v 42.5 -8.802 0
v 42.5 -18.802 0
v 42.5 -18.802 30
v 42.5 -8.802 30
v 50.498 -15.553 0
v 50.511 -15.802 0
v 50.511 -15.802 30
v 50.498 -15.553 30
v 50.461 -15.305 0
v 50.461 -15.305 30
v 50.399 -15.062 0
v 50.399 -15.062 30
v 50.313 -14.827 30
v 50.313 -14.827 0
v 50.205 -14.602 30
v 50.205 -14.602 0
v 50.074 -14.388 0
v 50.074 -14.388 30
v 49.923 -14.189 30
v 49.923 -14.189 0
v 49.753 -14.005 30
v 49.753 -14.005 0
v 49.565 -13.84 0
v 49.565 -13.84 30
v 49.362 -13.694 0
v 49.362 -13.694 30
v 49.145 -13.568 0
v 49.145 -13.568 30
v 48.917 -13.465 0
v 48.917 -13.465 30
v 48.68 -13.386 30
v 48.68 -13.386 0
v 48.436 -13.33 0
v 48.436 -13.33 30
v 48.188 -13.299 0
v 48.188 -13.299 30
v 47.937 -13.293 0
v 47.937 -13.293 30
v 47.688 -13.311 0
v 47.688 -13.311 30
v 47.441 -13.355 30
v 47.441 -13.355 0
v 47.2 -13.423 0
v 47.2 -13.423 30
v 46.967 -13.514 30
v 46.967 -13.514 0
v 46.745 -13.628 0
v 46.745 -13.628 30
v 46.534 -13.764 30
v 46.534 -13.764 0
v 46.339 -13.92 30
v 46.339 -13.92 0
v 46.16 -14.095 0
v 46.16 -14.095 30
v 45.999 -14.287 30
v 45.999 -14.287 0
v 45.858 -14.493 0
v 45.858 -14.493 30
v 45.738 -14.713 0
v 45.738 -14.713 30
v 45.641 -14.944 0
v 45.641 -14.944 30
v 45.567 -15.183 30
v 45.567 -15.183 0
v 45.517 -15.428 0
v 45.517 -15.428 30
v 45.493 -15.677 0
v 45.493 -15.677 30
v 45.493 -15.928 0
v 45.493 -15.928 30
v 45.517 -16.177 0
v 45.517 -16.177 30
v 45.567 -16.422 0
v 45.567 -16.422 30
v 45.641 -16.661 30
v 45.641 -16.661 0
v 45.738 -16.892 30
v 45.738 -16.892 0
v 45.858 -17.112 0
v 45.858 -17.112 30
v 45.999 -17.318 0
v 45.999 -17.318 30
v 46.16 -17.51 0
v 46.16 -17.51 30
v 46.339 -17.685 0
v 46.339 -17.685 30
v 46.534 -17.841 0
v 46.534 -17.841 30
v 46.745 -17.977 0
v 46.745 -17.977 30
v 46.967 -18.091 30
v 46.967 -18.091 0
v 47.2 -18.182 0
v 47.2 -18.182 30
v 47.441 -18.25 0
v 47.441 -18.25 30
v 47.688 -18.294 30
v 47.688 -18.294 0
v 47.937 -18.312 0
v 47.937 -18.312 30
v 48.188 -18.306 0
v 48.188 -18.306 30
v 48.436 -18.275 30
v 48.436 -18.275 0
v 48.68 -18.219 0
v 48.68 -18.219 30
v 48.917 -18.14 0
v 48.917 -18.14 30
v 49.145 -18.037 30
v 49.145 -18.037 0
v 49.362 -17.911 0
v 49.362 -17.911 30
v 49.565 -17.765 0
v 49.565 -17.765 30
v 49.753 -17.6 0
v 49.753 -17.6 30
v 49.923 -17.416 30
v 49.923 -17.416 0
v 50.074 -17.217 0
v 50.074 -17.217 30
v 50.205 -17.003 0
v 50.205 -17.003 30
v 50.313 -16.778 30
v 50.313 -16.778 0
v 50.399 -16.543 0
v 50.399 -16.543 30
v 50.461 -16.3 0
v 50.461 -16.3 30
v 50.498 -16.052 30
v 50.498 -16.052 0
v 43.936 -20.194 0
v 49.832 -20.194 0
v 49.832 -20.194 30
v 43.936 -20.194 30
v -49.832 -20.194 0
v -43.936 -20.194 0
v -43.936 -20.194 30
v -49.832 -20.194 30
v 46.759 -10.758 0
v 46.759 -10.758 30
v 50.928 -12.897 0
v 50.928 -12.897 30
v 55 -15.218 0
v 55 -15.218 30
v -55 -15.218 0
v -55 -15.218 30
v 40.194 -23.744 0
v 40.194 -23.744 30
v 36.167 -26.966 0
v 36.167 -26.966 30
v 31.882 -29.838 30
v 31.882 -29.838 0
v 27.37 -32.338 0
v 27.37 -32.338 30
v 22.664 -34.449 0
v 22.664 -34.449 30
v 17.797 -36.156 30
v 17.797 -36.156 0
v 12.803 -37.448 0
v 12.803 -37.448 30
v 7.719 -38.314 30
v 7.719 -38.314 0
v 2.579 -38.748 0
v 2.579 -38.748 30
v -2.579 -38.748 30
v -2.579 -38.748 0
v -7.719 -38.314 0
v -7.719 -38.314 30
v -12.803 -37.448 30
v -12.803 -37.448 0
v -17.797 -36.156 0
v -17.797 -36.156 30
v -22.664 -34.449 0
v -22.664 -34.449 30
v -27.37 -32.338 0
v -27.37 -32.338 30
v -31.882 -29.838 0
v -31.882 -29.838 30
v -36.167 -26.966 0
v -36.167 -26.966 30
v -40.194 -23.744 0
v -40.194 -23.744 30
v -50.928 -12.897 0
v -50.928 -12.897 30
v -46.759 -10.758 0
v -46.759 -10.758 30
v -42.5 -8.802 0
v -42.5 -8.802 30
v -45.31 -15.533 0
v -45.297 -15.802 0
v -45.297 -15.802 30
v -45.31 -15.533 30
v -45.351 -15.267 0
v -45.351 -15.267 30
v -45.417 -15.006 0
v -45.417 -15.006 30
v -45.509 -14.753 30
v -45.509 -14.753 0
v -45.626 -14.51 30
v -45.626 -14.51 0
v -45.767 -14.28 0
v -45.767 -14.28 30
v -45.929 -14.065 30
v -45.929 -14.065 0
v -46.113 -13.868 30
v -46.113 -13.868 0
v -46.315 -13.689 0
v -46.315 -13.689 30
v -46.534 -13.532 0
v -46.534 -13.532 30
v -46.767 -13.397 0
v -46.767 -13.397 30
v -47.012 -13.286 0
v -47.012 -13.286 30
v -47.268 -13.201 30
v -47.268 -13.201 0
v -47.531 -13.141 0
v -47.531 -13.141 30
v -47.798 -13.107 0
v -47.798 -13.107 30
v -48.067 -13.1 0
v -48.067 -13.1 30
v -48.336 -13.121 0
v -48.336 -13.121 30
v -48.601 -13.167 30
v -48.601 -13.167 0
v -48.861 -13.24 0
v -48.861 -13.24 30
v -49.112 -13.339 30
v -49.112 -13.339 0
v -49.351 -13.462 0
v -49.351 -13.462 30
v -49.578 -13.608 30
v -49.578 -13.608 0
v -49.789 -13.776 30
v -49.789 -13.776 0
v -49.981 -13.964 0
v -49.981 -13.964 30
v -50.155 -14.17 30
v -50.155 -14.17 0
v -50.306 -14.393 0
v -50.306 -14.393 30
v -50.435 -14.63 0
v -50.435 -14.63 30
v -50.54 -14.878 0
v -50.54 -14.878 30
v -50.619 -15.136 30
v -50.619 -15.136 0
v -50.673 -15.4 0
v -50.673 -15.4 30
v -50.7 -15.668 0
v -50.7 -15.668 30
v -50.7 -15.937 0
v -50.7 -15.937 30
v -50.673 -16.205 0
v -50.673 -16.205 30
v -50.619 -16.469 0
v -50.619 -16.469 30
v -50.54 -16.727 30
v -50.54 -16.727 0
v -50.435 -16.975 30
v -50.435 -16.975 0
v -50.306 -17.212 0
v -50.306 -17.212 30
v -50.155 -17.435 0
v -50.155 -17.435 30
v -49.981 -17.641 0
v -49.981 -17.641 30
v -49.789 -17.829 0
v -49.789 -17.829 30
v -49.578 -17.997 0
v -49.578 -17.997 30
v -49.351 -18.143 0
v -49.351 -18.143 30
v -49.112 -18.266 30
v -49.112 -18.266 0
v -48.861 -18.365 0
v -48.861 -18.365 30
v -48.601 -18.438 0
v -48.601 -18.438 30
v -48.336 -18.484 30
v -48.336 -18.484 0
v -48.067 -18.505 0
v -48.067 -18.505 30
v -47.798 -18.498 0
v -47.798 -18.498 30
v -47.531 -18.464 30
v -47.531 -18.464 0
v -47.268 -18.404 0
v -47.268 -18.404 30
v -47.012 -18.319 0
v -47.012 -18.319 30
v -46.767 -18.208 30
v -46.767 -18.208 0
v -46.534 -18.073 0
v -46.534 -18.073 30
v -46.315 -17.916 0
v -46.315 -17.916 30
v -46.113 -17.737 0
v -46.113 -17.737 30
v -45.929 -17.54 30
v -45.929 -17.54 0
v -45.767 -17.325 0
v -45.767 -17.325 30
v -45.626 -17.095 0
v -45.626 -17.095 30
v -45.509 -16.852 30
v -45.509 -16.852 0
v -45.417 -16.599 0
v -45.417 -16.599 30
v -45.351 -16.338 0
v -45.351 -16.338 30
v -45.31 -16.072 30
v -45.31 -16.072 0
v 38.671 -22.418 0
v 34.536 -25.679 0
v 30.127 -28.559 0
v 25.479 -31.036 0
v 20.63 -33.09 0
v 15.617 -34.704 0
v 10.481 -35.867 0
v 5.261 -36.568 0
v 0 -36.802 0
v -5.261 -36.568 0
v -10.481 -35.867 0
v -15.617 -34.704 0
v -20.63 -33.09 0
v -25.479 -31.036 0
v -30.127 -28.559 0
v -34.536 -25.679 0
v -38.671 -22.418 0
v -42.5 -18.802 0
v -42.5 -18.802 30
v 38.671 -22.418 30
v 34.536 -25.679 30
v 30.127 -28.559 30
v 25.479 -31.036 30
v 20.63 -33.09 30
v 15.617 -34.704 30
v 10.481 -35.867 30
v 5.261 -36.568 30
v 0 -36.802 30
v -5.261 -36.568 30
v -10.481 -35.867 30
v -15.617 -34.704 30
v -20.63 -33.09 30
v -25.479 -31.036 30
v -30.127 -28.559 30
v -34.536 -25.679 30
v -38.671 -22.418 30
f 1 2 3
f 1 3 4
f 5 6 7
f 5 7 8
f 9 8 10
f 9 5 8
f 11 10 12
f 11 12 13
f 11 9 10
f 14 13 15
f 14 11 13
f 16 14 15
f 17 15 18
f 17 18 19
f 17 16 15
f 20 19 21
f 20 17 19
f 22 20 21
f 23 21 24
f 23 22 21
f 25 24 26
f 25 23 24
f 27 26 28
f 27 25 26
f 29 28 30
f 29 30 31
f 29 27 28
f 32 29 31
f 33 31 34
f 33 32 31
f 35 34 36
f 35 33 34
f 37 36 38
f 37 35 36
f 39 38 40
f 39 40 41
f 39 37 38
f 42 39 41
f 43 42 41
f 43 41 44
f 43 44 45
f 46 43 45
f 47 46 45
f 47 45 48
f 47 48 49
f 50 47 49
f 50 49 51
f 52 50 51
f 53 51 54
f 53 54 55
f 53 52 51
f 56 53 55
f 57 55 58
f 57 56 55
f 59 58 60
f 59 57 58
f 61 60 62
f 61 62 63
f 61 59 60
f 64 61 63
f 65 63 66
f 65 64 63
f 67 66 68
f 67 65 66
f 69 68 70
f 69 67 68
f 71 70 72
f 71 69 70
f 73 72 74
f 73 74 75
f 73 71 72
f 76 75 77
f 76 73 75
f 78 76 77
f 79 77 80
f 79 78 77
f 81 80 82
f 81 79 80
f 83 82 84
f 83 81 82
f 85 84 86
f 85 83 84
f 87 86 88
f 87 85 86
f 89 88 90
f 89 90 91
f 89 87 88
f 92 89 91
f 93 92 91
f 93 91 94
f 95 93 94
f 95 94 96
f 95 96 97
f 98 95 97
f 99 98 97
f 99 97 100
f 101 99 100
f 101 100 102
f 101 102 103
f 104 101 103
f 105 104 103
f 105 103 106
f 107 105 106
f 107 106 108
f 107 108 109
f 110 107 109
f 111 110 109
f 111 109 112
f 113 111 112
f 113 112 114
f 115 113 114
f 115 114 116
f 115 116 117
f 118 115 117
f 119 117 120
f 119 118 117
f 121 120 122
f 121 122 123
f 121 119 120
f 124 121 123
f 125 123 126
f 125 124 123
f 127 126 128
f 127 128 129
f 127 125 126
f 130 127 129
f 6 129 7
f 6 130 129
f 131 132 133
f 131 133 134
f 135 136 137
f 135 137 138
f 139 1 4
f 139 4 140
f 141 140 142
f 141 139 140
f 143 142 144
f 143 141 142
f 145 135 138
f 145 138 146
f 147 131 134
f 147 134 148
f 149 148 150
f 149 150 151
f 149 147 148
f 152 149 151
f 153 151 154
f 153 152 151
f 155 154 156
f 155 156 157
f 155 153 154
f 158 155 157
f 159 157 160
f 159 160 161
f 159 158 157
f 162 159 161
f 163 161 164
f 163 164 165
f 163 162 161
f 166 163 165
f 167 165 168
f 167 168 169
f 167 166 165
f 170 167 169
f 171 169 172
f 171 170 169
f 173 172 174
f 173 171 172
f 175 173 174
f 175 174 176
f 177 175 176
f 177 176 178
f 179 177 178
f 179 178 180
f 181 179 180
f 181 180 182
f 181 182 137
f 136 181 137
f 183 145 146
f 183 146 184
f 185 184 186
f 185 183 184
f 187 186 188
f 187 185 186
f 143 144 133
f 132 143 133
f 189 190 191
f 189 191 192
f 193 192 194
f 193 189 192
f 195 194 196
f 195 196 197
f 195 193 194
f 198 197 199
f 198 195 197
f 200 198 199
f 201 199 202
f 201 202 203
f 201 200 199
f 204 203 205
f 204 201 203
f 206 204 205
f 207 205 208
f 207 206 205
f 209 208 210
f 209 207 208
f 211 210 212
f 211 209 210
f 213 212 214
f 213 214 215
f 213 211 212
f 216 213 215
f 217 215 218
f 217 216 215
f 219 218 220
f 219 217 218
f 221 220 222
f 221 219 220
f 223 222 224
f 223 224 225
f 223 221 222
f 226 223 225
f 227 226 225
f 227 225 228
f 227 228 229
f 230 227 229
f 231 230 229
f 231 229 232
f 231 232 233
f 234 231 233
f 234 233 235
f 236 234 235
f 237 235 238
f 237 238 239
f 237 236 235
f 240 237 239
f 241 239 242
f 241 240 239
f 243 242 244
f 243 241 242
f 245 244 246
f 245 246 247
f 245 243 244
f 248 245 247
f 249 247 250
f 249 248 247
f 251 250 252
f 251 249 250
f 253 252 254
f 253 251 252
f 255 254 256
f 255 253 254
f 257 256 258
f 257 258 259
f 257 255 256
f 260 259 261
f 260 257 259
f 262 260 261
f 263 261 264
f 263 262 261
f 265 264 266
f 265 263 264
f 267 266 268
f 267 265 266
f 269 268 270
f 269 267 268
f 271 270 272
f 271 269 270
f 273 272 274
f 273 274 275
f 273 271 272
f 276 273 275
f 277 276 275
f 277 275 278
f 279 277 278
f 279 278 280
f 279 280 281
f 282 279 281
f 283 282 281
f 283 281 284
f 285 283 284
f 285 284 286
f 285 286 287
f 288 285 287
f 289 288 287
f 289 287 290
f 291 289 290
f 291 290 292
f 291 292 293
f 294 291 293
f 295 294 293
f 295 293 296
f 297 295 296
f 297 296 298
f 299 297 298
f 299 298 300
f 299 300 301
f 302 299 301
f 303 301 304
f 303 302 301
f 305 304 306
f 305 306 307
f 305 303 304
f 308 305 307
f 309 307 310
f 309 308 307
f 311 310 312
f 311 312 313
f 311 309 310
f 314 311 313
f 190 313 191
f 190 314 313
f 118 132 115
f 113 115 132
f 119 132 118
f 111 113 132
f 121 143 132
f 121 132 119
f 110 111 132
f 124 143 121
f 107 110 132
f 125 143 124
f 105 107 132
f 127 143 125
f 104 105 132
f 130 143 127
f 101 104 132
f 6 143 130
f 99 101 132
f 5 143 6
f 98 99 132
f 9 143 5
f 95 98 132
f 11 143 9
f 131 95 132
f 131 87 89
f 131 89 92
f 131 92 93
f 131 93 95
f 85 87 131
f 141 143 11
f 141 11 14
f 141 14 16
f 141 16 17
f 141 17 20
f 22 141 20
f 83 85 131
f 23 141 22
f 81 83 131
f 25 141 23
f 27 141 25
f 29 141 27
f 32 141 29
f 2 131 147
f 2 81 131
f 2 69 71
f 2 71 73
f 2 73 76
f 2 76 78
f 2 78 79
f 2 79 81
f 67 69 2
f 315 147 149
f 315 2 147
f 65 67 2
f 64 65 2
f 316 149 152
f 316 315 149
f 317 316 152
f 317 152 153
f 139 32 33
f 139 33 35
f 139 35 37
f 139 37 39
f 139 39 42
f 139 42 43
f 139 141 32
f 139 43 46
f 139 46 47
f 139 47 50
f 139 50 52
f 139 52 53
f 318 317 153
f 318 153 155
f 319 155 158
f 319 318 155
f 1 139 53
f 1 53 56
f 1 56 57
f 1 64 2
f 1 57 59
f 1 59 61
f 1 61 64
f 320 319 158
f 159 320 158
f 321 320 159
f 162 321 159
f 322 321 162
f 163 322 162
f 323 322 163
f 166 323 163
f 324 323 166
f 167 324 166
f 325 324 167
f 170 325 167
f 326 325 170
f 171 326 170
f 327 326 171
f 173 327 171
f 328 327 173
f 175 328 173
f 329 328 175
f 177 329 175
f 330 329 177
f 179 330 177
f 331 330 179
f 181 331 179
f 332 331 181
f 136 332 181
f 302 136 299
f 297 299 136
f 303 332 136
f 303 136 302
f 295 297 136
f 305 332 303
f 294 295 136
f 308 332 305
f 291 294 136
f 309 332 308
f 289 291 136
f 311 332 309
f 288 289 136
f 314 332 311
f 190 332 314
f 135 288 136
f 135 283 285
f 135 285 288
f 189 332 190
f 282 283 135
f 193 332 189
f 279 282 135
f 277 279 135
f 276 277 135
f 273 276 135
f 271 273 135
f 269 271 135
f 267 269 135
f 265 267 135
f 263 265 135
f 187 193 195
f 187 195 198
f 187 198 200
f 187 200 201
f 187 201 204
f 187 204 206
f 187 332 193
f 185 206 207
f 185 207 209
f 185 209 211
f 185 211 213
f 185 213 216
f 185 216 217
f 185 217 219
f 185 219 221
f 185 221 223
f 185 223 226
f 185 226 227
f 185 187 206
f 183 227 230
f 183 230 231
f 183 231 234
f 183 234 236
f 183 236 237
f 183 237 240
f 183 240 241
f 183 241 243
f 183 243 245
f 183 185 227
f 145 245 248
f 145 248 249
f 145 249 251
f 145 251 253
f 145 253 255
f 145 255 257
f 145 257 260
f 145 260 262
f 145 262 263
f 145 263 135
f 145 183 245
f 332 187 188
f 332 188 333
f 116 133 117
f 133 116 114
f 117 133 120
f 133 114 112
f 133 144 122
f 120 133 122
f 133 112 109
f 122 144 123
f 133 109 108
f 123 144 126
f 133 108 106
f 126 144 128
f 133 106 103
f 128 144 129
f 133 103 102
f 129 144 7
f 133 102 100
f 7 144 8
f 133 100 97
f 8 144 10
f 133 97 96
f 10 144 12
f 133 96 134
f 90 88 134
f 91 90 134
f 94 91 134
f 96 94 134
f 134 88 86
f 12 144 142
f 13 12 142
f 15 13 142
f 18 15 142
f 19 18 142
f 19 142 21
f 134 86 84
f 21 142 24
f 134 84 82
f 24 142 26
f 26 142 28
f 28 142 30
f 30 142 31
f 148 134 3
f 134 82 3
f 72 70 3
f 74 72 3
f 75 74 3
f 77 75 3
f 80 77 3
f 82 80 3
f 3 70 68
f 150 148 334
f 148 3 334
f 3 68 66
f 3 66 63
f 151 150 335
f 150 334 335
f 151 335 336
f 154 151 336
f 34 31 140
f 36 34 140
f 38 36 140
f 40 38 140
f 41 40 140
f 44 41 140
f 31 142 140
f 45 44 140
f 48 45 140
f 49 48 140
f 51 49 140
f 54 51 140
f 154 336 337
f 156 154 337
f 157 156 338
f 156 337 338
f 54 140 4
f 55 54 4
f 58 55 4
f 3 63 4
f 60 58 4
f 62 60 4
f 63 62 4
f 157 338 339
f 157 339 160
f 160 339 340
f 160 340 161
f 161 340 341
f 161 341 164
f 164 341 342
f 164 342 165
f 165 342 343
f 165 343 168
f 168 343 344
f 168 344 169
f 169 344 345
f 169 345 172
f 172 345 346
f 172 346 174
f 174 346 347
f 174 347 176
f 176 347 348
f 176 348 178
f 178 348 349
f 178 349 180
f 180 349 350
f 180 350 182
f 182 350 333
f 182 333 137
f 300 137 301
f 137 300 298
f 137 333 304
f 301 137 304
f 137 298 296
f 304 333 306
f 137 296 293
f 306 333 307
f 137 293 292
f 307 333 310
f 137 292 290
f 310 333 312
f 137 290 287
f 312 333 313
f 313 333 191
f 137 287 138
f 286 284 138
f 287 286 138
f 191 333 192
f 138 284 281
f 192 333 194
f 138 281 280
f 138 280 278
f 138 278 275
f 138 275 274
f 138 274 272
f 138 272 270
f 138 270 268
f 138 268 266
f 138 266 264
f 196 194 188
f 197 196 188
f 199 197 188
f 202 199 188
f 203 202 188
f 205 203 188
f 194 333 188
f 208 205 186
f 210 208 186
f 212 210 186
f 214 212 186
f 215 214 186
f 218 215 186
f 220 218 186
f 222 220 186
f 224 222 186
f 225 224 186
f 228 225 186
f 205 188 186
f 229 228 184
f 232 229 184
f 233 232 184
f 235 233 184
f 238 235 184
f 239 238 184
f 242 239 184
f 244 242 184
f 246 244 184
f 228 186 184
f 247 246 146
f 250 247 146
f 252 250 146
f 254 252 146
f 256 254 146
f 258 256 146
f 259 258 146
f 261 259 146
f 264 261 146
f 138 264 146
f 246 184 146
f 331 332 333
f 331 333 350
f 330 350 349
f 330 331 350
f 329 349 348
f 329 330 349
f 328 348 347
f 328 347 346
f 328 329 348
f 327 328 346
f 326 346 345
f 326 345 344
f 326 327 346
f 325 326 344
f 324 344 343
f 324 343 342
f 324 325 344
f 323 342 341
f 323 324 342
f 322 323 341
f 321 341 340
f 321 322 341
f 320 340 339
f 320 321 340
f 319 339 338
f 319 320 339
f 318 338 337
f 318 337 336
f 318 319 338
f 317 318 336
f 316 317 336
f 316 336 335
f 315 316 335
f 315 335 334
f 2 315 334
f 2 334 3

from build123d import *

# Parameters (mm, degrees)
SKETCH1_R           = 2.702962803
SKETCH1_R_2         = 2.510598202
BOSS_EXTRUDE1_DEPTH = 30


with BuildPart() as part:
    # Sketch1 → Boss-Extrude1 (new body)
    with BuildSketch(Plane.XY):
        with BuildLine():
            Line((-42.5, -8.80249494), (-42.5, -18.80249494))
            ThreePointArc((-42.5, -18.80249494), (0, -36.80249494), (42.5, -18.80249494))
            Line((42.5, -18.80249494), (42.5, -8.80249494))
            ThreePointArc((42.5, -8.80249494), (48.855409625, -11.804679997), (55, -15.217648755))
            Line((55, -15.217648755), (49.831703302, -20.194115642))
            Line((49.831703302, -20.194115642), (43.936451121, -20.194115642))
            ThreePointArc((43.936451121, -20.194115642), (0, -38.80249494), (-43.936451121, -20.194115642))
            Line((-43.936451121, -20.194115642), (-49.831703302, -20.194115642))
            Line((-49.831703302, -20.194115642), (-55, -15.217648755))
            ThreePointArc((-55, -15.217648755), (-48.855409625, -11.804679997), (-42.5, -8.80249494))
        make_face()
        with Locations((-48, -15.80249494)):
            Circle(SKETCH1_R, mode=Mode.SUBTRACT)
        with Locations((48, -15.80249494)):
            Circle(SKETCH1_R_2, mode=Mode.SUBTRACT)
    extrude(amount=BOSS_EXTRUDE1_DEPTH)


solid = part.part
